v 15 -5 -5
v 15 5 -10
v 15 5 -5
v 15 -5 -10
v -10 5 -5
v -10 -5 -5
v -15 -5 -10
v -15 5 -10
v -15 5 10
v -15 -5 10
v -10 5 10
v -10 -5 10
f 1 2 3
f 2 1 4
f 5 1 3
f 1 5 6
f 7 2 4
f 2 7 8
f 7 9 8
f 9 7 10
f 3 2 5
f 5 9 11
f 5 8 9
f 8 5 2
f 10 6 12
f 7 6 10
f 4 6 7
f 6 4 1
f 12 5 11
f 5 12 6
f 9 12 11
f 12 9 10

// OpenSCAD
// Auto-generated from tests/data/feature_fixtures_manifest.json
// fixture: l_bracket_wide
// fixture_type: l_bracket
// description: Wide L-bracket (30x10x20 envelope, leg_thickness=5.0). Wider Y extrusion depth variant.
$fn = 96;

bracket_size = [30.000000, 10.000000, 20.000000];
leg_thickness = 5.000000;
bracket_origin = [-15.000000, -5.000000, -10.000000];

union() {
  translate(bracket_origin) cube([bracket_size[0], bracket_size[1], leg_thickness]);
  translate(bracket_origin) cube([leg_thickness, bracket_size[1], bracket_size[2]]);
}
